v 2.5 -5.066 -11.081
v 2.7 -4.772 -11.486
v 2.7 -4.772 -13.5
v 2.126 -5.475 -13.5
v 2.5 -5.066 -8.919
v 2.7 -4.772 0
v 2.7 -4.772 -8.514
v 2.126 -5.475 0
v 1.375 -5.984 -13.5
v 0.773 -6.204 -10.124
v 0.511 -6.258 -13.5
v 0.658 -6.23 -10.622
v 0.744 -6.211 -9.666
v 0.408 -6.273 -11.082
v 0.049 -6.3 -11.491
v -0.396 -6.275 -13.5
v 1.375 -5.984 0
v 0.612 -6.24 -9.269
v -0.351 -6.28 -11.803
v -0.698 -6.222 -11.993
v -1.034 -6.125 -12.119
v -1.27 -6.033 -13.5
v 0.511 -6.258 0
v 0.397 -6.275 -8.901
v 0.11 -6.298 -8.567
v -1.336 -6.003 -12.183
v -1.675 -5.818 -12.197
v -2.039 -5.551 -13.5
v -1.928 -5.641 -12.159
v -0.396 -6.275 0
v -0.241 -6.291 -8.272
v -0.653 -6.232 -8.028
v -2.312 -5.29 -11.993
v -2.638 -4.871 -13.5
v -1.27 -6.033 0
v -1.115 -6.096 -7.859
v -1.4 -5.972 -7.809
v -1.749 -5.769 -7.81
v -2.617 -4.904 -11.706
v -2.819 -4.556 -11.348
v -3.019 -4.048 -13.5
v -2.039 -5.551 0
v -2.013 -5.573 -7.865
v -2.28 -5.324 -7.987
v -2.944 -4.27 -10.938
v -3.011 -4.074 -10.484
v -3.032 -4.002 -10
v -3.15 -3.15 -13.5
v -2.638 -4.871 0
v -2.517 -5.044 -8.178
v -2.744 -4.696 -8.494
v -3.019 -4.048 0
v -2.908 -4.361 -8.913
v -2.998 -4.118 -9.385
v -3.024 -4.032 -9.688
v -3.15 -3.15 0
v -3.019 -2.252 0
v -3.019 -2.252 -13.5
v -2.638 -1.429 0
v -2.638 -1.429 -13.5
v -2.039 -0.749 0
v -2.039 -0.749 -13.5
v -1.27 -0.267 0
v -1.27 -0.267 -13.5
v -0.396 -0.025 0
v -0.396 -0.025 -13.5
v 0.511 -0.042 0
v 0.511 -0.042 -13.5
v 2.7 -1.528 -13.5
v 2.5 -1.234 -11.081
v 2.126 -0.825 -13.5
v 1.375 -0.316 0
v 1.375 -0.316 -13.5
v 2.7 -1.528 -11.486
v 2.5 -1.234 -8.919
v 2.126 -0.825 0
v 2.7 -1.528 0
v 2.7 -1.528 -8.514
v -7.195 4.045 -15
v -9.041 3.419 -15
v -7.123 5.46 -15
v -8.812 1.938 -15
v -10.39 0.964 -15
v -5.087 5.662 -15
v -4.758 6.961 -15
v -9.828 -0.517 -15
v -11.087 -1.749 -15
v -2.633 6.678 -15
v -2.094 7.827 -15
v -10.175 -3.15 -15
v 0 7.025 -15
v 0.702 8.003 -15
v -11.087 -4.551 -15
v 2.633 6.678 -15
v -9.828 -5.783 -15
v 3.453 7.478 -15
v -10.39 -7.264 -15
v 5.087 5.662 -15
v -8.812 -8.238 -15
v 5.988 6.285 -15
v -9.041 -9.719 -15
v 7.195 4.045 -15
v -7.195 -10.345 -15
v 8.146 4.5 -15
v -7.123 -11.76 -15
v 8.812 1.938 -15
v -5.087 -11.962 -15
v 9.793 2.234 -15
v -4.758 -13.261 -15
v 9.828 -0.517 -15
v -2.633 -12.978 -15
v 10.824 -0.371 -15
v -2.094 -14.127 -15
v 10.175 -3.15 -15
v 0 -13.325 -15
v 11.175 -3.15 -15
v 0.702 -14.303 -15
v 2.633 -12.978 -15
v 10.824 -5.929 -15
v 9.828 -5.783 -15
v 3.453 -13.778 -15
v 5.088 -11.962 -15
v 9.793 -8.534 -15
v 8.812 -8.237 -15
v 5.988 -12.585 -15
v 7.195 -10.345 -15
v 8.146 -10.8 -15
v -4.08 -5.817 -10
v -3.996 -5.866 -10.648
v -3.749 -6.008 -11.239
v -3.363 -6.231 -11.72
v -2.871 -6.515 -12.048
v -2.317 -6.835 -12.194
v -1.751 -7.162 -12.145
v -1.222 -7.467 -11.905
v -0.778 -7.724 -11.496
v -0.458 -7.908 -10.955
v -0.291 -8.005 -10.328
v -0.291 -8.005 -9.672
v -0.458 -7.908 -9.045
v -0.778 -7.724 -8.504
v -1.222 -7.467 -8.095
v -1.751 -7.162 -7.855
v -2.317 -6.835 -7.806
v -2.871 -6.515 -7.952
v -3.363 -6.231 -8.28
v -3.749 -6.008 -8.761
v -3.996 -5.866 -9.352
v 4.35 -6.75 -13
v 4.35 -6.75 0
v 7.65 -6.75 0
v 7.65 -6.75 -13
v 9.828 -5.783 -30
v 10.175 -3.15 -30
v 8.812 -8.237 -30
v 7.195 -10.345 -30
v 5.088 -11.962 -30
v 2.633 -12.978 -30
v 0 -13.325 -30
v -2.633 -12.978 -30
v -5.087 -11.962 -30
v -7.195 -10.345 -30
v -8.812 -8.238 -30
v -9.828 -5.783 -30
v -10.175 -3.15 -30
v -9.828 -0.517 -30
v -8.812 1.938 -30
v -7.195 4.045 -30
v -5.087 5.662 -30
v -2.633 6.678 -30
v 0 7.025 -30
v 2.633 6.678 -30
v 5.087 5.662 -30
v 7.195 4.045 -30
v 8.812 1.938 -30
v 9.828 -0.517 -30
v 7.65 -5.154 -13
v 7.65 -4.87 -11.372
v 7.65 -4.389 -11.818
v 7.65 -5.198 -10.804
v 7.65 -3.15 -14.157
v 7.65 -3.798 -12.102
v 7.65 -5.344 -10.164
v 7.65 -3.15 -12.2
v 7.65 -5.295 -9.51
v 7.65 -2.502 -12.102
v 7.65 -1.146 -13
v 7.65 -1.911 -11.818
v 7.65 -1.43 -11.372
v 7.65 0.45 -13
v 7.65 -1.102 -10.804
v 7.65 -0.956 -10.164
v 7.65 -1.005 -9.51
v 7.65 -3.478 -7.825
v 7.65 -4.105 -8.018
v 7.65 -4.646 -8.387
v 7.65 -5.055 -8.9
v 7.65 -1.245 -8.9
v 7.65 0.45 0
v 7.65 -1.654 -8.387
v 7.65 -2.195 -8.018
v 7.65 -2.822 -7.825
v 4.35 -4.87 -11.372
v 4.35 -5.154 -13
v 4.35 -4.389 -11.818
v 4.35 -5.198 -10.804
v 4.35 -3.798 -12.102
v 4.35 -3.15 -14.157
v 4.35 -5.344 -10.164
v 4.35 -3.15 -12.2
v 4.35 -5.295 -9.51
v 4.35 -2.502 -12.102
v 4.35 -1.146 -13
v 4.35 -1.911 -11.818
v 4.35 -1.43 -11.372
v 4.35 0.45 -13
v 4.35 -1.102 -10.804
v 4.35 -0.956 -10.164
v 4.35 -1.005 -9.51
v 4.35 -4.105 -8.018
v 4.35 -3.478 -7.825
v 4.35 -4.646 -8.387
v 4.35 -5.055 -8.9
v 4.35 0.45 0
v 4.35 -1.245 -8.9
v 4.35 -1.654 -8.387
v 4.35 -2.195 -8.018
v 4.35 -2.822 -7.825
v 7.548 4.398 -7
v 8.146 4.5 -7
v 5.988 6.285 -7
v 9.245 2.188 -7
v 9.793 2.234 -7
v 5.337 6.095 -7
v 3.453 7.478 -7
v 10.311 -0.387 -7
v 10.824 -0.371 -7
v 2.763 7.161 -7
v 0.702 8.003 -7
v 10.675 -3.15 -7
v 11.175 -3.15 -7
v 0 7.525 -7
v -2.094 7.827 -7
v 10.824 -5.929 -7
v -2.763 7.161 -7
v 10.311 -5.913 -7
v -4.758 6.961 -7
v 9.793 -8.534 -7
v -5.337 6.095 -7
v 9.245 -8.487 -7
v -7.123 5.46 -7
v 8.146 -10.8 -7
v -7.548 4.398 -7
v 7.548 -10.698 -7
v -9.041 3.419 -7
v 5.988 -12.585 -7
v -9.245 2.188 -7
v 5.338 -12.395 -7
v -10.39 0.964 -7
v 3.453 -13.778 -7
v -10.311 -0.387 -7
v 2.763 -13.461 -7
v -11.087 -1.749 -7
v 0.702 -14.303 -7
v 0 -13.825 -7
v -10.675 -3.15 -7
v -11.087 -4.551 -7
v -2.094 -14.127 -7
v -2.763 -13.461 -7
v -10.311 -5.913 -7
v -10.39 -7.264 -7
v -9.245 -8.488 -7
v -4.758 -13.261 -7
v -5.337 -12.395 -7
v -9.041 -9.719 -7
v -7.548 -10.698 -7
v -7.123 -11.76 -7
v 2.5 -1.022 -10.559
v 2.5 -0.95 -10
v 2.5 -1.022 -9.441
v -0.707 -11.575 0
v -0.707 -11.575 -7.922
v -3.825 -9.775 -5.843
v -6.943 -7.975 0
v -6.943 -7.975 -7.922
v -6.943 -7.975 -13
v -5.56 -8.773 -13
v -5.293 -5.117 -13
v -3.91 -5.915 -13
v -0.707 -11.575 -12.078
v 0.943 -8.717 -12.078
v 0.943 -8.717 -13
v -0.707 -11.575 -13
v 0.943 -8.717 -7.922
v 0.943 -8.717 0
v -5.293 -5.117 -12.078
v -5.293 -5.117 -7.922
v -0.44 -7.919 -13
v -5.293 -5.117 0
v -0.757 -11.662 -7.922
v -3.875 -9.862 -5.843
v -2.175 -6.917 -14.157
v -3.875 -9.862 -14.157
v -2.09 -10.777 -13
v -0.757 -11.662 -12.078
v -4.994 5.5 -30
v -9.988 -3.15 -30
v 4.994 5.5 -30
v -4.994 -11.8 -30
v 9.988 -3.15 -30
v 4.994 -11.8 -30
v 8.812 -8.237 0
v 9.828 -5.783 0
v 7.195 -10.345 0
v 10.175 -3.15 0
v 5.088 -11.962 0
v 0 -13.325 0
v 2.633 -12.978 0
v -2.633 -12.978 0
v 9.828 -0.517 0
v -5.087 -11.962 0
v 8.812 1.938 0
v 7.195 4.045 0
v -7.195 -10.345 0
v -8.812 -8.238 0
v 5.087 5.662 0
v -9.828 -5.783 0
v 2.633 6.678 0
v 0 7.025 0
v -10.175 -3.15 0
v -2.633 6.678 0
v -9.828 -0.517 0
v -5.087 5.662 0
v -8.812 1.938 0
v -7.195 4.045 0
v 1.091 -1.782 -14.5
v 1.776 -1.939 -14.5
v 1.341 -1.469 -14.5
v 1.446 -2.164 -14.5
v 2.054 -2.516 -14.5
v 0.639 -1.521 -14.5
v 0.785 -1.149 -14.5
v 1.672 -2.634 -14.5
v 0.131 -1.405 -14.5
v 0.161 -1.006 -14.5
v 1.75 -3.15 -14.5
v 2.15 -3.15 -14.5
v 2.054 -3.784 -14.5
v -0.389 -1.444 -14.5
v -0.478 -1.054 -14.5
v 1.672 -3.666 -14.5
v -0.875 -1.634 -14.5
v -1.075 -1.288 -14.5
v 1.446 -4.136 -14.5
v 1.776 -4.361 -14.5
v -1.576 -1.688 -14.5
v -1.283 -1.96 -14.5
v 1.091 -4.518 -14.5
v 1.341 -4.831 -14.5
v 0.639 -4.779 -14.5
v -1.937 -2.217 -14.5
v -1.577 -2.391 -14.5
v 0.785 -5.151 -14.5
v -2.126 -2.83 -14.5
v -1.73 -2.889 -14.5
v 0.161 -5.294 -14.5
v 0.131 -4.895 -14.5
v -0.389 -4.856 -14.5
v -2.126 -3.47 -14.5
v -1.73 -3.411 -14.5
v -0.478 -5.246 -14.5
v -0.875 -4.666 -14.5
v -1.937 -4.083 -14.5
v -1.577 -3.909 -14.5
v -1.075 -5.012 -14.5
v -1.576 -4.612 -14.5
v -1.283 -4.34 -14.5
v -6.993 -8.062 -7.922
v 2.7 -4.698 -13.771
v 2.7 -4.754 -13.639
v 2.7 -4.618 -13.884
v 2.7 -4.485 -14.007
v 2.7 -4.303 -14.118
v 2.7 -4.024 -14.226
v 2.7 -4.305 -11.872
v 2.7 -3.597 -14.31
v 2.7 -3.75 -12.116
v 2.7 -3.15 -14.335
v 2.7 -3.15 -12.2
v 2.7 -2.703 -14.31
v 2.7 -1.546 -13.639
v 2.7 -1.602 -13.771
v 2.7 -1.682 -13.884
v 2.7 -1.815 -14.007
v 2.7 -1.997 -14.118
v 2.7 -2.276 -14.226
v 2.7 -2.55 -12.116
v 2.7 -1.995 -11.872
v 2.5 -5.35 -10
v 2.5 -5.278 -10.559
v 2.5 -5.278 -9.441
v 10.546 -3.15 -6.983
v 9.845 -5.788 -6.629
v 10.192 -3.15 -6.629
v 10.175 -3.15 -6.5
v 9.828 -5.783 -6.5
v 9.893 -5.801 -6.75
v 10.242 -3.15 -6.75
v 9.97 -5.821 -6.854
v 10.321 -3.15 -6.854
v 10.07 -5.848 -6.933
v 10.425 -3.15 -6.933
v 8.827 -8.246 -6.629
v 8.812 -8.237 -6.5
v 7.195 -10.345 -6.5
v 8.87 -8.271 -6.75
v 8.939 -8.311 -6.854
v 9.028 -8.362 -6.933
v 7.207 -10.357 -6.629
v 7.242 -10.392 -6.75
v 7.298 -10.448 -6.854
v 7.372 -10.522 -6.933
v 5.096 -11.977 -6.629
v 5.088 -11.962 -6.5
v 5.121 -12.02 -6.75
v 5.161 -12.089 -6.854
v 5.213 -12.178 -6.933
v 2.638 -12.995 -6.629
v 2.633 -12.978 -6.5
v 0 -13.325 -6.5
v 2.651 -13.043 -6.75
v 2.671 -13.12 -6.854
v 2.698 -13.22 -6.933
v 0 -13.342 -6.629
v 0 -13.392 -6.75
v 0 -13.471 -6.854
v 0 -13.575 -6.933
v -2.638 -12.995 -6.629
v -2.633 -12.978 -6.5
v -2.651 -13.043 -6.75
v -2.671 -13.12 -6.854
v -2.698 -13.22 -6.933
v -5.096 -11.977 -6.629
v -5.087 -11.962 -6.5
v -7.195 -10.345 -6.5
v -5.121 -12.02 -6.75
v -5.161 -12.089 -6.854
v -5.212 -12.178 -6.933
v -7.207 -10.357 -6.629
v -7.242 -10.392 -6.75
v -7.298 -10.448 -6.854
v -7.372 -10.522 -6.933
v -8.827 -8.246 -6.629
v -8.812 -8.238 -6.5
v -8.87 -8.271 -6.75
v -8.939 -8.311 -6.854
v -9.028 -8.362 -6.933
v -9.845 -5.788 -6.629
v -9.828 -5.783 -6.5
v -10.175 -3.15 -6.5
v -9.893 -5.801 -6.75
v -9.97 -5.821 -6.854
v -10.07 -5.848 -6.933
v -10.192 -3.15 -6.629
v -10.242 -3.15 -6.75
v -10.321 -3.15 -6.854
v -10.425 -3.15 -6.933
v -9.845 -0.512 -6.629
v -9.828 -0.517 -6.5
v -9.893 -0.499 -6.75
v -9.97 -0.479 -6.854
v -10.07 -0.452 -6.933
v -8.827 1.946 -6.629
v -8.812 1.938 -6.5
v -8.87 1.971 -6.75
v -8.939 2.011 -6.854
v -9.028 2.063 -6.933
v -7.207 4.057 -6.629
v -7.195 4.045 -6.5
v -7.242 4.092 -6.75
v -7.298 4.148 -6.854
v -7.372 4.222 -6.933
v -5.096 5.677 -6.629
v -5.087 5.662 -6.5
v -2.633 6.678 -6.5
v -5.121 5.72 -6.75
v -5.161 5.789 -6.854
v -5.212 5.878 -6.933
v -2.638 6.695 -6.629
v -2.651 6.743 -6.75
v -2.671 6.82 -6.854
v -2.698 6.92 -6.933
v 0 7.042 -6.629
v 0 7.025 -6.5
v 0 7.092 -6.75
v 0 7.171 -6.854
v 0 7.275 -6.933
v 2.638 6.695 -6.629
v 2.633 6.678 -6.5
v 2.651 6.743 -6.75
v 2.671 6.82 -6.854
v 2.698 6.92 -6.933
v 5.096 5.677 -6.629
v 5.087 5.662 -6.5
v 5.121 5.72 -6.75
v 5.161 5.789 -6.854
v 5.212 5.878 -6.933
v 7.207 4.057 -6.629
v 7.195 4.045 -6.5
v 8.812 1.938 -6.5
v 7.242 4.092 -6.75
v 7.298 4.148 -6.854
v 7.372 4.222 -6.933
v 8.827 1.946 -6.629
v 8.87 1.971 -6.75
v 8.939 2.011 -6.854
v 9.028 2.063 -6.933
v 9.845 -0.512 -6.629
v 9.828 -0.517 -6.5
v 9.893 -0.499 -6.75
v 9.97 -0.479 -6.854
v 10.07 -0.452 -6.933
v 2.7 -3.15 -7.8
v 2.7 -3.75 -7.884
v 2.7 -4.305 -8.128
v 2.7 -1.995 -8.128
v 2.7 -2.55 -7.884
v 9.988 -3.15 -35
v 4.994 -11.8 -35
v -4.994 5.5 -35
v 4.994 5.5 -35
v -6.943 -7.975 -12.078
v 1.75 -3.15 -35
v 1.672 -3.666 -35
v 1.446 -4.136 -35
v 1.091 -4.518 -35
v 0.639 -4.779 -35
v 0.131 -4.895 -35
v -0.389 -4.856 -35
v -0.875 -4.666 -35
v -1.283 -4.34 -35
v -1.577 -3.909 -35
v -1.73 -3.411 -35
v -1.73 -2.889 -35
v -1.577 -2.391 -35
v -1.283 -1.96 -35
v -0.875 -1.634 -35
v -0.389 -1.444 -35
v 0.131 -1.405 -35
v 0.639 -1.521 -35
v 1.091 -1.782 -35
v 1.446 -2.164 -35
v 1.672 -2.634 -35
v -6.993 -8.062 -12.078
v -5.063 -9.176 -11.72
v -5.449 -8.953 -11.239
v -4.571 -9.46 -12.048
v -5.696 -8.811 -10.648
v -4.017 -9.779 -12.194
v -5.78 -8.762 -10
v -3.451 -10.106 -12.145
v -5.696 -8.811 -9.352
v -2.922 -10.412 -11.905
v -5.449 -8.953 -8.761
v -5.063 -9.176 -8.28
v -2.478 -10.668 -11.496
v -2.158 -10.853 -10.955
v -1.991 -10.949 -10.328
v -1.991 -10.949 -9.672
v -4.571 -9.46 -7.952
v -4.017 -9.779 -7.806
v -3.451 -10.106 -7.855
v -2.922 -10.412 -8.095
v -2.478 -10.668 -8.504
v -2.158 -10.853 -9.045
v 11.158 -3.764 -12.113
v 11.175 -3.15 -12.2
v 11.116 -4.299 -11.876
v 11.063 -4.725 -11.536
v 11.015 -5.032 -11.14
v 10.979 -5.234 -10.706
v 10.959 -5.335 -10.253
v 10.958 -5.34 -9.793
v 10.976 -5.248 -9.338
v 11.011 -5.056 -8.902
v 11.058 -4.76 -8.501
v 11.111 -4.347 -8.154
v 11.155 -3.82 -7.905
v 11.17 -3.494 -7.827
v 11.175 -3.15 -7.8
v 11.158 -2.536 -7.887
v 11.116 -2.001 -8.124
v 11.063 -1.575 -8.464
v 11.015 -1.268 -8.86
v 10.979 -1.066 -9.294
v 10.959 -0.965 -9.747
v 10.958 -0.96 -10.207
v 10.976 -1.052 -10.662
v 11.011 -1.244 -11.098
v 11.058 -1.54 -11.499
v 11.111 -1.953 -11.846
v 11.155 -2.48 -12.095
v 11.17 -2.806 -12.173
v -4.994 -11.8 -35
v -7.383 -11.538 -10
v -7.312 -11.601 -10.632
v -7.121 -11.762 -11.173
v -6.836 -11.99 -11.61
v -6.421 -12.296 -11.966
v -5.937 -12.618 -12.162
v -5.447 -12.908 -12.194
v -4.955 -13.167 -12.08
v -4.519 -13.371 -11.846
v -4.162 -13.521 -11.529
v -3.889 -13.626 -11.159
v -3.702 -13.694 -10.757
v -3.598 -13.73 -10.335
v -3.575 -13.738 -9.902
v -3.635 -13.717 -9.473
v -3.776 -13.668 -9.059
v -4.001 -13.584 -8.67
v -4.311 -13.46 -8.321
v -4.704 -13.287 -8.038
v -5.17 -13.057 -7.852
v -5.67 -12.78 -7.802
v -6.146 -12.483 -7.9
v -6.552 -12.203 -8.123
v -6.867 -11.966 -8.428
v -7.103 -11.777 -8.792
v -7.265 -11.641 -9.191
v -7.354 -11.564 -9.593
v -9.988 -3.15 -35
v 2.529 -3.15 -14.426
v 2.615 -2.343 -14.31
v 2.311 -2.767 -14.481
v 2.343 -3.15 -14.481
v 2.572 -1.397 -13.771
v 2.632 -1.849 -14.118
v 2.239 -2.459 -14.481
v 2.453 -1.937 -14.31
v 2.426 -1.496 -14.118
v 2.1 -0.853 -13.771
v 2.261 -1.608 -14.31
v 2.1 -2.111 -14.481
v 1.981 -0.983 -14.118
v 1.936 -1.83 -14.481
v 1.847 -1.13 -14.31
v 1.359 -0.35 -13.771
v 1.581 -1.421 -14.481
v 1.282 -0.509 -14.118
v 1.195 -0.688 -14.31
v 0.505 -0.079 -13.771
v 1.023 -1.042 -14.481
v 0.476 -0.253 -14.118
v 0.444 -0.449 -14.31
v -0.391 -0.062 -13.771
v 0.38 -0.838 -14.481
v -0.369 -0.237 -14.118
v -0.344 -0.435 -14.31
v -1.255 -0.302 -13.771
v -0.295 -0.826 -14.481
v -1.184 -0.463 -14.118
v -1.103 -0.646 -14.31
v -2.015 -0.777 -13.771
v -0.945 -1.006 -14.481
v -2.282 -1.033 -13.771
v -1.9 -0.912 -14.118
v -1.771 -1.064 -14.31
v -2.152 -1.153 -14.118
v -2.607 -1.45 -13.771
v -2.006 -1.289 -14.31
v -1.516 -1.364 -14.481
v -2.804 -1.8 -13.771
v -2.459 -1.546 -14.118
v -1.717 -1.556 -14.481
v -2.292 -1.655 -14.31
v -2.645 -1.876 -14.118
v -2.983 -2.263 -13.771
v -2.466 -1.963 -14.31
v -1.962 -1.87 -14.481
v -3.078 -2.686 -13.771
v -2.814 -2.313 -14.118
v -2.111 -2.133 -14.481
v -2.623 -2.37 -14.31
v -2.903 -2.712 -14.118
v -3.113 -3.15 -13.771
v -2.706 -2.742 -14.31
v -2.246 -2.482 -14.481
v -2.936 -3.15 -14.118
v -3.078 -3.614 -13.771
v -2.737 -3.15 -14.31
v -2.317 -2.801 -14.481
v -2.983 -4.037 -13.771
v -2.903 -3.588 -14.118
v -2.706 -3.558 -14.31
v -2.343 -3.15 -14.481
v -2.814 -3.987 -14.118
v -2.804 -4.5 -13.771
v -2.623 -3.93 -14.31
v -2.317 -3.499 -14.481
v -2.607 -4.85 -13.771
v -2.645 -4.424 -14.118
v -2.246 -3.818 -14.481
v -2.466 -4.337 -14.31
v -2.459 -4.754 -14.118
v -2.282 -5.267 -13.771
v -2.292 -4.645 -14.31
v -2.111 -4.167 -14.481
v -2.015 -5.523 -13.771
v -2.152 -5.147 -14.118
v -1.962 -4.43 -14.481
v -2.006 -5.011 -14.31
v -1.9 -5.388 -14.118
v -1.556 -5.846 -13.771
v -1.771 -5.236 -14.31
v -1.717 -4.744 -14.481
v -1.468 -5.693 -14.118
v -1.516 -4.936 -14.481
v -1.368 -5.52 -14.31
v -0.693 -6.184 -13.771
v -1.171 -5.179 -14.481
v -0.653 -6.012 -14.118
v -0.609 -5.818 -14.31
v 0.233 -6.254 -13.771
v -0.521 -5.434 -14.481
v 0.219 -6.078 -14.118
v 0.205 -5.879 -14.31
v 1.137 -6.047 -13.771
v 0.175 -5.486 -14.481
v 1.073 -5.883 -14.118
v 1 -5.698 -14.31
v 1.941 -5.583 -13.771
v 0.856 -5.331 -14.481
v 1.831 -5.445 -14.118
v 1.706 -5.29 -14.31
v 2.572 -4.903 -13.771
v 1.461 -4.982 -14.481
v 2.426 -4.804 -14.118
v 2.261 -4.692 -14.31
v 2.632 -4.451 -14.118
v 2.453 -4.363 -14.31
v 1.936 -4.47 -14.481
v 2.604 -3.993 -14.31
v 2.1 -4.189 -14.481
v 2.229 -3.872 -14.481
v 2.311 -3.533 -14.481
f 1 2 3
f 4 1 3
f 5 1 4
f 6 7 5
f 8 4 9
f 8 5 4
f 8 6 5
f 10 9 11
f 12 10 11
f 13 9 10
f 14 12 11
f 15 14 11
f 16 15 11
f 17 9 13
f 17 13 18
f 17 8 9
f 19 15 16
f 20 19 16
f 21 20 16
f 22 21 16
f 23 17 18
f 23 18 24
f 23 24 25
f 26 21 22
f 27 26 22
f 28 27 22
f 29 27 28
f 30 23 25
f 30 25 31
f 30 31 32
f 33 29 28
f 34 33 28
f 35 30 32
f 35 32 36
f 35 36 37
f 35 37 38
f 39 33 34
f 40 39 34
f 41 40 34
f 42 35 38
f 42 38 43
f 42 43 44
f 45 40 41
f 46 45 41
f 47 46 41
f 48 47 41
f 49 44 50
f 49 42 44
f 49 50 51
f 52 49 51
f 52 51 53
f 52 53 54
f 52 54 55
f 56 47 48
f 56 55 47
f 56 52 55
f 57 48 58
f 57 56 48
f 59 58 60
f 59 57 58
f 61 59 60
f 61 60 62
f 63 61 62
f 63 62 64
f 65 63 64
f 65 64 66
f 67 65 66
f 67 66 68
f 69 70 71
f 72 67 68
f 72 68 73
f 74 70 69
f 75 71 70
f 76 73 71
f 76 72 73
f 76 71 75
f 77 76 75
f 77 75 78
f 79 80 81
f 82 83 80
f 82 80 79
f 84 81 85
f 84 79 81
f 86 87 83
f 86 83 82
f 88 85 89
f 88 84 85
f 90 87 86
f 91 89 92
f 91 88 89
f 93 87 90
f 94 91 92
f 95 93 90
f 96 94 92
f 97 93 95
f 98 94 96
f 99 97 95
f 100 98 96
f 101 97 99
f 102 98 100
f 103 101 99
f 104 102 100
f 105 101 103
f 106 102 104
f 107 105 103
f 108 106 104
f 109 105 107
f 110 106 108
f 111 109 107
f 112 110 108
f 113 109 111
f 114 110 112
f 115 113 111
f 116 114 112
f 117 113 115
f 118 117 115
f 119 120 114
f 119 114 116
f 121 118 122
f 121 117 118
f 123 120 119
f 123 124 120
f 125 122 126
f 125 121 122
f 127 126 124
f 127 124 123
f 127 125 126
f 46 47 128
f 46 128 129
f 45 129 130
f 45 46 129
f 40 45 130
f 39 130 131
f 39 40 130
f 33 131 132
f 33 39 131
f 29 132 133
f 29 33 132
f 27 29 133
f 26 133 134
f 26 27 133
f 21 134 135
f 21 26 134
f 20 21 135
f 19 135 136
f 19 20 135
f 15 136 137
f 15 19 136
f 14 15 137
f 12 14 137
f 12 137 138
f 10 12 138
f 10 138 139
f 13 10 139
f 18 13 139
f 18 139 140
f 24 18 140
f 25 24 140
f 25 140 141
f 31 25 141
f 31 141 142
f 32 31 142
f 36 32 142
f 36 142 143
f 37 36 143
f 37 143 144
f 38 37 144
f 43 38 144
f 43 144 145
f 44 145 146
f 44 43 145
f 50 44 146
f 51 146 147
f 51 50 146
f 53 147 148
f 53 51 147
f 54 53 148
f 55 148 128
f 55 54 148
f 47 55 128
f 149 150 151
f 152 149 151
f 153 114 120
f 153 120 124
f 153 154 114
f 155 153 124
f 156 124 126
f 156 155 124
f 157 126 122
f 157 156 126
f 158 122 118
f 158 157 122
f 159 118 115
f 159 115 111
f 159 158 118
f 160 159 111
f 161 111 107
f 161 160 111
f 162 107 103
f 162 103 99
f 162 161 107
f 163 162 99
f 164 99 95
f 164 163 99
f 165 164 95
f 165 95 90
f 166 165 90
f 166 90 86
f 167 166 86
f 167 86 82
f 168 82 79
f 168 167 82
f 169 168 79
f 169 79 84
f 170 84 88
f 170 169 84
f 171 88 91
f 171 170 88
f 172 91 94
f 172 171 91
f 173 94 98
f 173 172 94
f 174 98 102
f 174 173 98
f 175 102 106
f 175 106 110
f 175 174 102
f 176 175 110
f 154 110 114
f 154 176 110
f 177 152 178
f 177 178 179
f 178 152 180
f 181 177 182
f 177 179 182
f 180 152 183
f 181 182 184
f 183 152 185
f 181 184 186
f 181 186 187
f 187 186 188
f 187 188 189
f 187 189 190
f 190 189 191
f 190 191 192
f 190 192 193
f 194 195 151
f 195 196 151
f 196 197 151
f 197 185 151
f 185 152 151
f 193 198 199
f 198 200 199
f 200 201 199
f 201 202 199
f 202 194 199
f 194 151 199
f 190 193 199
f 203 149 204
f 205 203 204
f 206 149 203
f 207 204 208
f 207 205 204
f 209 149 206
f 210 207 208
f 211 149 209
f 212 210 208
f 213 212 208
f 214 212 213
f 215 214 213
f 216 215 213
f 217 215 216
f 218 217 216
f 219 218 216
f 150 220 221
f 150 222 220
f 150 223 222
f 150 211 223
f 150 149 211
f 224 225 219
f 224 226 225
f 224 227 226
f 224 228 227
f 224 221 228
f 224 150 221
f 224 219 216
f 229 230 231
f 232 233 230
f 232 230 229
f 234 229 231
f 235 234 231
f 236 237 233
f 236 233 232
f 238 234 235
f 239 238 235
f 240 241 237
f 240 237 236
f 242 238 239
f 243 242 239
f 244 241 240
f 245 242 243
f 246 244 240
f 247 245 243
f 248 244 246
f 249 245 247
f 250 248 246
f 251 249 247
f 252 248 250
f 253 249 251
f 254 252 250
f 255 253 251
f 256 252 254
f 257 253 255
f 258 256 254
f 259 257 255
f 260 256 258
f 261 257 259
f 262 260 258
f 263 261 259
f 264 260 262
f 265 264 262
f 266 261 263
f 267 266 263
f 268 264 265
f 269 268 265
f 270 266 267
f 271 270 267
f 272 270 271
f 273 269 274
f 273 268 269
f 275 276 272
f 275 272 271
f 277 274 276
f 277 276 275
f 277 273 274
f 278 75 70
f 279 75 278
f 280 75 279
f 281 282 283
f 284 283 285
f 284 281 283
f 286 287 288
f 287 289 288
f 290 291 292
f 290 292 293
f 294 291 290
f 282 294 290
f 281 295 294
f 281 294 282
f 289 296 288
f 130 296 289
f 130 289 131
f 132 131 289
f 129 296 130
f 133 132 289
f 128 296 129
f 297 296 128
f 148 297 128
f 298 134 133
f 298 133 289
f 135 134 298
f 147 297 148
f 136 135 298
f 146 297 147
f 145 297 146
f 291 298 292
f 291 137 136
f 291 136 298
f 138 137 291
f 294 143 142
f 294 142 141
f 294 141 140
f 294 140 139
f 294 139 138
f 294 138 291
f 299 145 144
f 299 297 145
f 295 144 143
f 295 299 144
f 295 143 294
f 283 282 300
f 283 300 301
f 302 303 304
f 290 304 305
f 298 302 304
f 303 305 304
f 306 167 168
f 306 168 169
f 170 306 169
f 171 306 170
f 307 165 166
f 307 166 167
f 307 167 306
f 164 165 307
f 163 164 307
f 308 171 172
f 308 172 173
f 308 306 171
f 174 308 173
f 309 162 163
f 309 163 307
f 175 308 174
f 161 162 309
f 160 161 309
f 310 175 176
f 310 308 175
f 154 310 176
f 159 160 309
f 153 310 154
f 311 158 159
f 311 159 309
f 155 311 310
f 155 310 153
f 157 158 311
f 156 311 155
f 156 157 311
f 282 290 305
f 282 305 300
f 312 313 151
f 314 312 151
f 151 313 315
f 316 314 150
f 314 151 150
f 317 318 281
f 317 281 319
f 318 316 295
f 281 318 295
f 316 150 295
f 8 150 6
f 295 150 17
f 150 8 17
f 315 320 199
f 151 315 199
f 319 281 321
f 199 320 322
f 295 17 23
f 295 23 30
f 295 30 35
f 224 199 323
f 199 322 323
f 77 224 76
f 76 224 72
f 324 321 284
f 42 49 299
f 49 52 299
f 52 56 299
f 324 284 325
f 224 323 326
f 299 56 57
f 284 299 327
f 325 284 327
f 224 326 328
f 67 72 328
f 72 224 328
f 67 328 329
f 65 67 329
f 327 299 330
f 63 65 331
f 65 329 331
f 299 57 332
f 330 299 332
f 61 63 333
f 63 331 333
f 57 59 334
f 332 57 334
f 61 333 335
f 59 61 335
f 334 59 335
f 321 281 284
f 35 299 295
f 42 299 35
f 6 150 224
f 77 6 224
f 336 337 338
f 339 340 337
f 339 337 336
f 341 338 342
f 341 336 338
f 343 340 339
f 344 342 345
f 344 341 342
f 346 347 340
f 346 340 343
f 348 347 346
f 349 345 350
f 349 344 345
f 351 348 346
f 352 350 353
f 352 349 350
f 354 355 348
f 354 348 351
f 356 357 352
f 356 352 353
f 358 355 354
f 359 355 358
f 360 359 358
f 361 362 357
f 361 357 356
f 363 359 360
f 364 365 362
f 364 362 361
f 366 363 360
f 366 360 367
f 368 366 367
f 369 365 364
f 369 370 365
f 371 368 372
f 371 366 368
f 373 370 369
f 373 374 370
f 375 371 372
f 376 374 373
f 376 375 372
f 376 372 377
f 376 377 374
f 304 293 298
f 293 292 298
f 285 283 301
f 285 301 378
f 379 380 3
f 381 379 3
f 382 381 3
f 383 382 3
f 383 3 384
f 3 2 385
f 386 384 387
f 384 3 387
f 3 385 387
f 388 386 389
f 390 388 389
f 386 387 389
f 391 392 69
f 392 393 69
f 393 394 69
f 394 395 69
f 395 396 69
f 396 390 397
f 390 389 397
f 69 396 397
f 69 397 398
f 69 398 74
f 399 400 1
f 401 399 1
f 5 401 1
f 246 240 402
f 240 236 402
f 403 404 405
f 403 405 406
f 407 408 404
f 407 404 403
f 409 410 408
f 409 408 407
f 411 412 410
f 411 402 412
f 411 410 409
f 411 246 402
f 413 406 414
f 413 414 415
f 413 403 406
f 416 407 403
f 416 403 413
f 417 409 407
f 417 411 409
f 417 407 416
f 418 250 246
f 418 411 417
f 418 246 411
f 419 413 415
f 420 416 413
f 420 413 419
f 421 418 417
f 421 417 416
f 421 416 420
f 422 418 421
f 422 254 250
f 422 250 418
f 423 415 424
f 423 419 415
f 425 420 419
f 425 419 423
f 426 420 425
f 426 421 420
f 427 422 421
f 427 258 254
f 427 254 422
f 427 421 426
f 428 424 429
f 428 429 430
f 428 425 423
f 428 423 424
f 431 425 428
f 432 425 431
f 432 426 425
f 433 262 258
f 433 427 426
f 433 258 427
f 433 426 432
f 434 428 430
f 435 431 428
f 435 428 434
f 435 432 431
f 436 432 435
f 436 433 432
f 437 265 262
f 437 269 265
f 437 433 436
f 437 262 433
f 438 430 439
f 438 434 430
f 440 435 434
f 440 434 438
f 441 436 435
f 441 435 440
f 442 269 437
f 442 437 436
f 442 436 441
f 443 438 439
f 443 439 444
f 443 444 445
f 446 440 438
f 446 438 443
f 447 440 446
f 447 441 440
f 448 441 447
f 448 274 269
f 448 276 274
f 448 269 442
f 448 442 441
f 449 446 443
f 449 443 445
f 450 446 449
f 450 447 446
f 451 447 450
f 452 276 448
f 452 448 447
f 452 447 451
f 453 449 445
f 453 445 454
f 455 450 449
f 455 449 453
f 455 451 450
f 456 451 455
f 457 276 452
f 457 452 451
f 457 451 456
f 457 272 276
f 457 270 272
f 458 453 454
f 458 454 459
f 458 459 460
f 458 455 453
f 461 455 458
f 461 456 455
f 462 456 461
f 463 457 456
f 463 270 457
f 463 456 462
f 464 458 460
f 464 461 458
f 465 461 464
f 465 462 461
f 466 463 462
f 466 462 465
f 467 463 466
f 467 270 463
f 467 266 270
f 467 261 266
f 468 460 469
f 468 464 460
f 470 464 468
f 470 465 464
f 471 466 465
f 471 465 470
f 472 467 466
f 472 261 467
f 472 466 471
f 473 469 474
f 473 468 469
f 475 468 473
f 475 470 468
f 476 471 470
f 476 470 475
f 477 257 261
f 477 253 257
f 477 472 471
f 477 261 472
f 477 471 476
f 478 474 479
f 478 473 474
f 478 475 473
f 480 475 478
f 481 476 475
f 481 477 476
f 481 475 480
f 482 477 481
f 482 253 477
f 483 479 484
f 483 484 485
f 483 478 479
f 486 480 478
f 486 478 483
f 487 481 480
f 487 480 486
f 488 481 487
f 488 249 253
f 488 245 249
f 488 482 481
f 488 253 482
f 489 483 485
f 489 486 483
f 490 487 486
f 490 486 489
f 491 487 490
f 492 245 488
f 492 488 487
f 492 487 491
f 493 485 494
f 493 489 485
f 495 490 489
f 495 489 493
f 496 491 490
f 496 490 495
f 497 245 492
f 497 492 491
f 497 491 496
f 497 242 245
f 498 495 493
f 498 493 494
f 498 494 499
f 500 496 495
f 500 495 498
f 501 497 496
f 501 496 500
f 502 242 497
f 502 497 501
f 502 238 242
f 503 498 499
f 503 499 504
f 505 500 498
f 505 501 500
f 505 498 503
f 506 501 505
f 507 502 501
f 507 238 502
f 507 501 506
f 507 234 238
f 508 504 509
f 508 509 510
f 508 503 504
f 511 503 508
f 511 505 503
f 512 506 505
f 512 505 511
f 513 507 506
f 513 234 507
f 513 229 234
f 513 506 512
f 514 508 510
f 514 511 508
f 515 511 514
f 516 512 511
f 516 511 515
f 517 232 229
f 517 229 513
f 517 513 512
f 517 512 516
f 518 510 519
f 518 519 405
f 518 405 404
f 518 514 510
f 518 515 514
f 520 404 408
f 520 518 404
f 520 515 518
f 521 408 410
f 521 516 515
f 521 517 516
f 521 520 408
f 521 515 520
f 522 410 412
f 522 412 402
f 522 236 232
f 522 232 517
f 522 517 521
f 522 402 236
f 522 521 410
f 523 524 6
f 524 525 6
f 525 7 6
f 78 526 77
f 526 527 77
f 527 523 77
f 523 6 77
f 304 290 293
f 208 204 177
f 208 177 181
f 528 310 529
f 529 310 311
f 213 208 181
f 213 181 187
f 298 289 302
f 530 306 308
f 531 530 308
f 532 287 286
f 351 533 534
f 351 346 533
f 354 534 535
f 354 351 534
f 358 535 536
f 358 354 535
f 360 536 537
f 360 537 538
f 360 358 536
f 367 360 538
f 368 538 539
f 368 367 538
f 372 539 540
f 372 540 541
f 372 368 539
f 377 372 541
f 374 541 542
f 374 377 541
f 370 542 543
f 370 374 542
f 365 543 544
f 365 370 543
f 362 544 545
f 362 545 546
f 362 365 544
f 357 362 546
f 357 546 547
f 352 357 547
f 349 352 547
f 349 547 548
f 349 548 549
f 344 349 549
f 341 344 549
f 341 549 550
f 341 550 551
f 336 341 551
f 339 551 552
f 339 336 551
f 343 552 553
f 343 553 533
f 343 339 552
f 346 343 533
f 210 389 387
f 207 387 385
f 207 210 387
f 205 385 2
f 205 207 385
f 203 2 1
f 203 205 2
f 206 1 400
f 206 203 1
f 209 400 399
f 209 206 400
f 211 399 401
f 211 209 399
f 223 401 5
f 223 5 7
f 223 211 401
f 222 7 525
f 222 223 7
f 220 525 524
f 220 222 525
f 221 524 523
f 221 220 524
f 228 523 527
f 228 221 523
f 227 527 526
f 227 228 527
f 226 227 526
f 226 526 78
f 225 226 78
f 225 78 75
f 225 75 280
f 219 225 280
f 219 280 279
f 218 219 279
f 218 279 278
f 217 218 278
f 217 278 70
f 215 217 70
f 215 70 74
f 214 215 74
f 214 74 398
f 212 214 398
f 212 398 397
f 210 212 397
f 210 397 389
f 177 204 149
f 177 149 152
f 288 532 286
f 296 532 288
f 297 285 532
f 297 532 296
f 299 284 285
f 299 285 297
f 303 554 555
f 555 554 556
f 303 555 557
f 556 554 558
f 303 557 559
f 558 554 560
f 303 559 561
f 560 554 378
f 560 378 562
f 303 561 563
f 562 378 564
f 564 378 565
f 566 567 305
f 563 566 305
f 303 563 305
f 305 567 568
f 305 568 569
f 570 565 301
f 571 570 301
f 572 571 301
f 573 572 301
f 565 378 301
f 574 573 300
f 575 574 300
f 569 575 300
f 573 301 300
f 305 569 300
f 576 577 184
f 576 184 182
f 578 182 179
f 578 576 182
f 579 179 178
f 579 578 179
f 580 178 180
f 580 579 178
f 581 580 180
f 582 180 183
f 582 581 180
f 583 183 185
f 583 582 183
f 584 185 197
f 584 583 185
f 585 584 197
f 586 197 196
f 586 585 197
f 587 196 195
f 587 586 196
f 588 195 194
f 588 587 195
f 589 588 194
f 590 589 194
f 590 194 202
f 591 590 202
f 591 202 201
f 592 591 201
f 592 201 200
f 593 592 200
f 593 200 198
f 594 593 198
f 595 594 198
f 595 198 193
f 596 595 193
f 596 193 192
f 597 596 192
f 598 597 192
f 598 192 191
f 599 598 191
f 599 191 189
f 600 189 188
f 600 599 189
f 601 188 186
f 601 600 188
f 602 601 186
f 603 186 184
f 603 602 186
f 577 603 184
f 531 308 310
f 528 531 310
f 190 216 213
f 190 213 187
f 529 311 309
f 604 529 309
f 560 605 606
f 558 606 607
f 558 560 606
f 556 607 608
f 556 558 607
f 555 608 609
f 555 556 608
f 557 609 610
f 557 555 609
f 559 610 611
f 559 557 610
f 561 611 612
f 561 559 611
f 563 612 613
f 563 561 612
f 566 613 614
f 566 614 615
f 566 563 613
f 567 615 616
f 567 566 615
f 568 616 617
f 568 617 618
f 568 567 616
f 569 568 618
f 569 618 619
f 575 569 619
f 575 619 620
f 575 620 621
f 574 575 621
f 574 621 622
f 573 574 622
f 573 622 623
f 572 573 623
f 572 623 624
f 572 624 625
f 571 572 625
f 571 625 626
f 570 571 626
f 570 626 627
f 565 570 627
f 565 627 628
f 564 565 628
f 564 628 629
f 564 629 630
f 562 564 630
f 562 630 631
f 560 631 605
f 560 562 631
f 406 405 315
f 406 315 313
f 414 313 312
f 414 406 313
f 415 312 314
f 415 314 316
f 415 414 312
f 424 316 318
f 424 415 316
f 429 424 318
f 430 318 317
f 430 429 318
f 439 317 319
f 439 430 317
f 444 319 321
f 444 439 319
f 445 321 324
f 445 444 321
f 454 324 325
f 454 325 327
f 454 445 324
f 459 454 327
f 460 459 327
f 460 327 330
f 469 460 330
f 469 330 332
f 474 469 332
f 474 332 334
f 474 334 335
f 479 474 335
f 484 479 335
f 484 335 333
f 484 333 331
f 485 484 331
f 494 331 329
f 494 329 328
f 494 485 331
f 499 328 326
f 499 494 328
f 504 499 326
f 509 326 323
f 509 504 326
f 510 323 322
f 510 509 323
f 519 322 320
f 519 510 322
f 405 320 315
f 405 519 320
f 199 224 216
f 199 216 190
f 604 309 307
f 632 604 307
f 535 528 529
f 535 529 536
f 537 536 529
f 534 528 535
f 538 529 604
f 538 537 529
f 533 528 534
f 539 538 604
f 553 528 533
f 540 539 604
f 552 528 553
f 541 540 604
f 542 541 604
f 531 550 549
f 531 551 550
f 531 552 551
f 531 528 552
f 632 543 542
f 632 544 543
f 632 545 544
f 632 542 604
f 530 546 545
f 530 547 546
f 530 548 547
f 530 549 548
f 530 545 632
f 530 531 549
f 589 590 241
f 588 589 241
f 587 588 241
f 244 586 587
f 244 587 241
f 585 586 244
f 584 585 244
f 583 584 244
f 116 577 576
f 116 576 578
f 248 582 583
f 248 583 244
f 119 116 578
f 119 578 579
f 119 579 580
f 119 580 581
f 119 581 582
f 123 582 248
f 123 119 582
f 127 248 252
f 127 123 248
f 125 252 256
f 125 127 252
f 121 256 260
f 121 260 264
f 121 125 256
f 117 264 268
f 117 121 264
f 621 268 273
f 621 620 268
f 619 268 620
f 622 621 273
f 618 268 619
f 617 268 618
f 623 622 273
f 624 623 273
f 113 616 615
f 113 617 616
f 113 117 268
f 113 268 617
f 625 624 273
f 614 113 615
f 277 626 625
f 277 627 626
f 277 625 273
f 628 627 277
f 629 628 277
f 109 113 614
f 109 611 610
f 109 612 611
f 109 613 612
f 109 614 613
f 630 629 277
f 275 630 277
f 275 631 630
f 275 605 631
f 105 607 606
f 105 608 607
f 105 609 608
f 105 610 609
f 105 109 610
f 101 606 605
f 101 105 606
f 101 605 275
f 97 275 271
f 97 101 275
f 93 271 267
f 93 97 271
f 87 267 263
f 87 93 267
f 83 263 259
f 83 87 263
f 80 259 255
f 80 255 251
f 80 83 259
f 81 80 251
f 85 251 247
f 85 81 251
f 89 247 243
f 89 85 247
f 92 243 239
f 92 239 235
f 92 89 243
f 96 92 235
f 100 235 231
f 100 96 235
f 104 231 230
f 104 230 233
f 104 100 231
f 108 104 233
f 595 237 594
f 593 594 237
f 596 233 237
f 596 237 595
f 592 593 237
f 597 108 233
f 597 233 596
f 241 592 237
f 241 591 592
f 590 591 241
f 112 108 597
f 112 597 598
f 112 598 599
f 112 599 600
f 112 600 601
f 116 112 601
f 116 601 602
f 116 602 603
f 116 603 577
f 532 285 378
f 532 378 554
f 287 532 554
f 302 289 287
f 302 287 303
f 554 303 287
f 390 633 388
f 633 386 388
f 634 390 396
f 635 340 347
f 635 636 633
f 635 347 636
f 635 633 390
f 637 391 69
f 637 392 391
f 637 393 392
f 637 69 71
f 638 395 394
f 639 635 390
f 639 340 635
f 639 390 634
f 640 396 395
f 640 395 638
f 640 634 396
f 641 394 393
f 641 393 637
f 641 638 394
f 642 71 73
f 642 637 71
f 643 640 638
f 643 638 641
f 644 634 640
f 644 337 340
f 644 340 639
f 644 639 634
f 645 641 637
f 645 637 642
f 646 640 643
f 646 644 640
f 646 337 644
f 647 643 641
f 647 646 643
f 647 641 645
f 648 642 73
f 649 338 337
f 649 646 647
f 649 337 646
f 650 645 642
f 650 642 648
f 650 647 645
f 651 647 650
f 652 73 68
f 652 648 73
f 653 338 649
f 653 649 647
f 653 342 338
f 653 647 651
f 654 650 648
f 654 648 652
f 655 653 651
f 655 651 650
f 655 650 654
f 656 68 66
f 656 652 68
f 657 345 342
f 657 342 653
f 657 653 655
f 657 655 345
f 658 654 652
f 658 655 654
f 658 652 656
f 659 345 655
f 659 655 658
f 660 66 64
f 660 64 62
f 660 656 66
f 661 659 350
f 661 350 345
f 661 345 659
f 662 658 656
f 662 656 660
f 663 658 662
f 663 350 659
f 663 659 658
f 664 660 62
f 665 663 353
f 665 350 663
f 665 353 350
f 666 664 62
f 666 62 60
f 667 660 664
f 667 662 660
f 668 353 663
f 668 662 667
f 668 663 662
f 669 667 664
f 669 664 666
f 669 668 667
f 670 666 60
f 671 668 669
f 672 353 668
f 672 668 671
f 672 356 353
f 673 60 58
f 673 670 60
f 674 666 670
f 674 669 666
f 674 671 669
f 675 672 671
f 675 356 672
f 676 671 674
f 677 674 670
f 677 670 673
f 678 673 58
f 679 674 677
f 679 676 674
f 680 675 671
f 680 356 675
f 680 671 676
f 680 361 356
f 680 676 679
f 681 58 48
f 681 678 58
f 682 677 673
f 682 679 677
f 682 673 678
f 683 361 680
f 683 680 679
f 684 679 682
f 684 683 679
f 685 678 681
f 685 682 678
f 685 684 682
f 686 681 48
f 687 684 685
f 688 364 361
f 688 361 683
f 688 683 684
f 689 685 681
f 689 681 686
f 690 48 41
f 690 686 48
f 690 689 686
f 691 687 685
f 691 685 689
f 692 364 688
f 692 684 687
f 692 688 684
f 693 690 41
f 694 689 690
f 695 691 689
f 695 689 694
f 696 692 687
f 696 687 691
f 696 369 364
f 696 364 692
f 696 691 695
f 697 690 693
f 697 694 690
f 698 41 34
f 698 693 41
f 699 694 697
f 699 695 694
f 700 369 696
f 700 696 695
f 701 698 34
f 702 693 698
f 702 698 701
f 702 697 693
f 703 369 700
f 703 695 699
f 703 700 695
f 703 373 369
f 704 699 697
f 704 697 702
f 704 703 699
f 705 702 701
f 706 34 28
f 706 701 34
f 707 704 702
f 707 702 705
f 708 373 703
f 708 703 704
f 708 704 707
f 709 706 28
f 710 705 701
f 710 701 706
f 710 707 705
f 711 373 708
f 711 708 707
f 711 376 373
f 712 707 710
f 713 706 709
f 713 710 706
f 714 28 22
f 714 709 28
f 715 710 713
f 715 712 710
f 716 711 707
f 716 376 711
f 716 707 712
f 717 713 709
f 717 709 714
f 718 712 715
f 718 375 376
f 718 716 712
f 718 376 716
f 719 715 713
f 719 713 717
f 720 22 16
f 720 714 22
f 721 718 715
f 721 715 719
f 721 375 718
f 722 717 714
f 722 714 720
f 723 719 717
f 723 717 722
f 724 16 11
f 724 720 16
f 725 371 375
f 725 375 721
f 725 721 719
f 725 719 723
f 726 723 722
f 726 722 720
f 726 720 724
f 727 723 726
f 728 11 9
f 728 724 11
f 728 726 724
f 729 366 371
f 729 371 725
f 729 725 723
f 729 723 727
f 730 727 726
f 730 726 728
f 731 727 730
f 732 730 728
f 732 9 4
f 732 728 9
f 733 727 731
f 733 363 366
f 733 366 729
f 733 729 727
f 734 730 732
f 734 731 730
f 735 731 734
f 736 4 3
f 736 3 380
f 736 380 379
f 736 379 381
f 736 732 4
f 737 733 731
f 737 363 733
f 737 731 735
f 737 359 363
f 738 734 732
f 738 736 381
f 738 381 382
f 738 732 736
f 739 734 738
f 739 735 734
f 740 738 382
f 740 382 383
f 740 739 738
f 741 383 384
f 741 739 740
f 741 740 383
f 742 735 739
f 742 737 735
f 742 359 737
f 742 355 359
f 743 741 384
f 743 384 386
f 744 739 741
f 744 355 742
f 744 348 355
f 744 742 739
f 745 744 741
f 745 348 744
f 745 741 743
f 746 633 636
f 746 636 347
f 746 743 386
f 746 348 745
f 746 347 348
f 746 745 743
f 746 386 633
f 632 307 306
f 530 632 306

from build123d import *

# Parameters (mm, degrees)
SKETCH_2_R               = 1.75
EXTRUDE_1_DEPTH          = 5
SKETCH_3_W               = 2.5
SKETCH_3_H               = 7.4
EXTRUDE_2_DEPTH          = 15
CUT_EXTRUDE_1_DEPTH      = 0.2
CUT_EXTRUDE_1_DEPTH_BACK = 12
SKETCH_4_R               = 2.2
SKETCH_9_W               = 3.3
SKETCH_9_H               = 7.2
CUT_EXTRUDE_5_DEPTH      = 13
CUT_EXTRUDE_6_DEPTH      = 3.3
CUT_EXTRUDE_7_DEPTH      = 10
CUT_EXTRUDE_7_DEPTH_BACK = 5
SKETCH_12_R              = 2.2
CUT_EXTRUDE_8_DEPTH      = 3.4
FILLET_2_R               = 0.5


with BuildPart() as part:
    # Эскиз1 → Повернуть1 (revolve)
    with BuildSketch(Plane(origin=(0, 0, 0), x_dir=(0, 0, -1), z_dir=(1, 0, 0)), mode=Mode.PRIVATE) as revolve_1_sk:
        Polygon((0, 0), (0, 7.025), (7, 7.025), (7, 8.025), (15, 8.025), (15, 7.025), (30, 7.025), (30, -1.4), (14.5, -1.4), (14.5, 0), align=None)
    revolve(revolve_1_sk.sketch.rotate(Axis((0, -3.15, 0), (0, 0, -1)), 90), axis=Axis((0, -3.15, 0), (0, 0, -1)))

    # Эскиз2 → Бобышка-Вытянуть1 (add)
    with BuildSketch(Plane(origin=(0, 0, -30), x_dir=(-1, 0, 0), z_dir=(0, 0, -1))):
        Polygon((4.994079828, 5.5), (-4.994079828, 5.5), (-9.988159657, -3.15), (-4.994079828, -11.8), (4.994079828, -11.8), (9.988159657, -3.15), align=None)
        with Locations(Location((0, -3.15, 0), (0, 0, 180))):
            Circle(SKETCH_2_R, mode=Mode.SUBTRACT)
    extrude(amount=EXTRUDE_1_DEPTH)

    # Эскиз3 → Бобышка-Вытянуть2 (add)
    with BuildSketch(Plane.XY):
        with BuildLine():
            Line((2.7, -4.772498074), (2.7, -1.527501926))
            ThreePointArc((2.7, -1.527501926), (3.15, -3.15), (2.7, -4.772498074))
        make_face()
        with Locations((5.7, -3.15)):
            Rectangle(SKETCH_3_W, SKETCH_3_H)
    extrude(amount=-EXTRUDE_2_DEPTH)

    # Эскиз4 → Вырез-Вытянуть1 (cut, two sides: drawn at the far end of the back side and taken through both)
    with BuildSketch(Plane.ZY.offset(-2.7).offset(-CUT_EXTRUDE_1_DEPTH_BACK)):
        with Locations(Location((-10, -3.15, 0), (0, 0, 180))):
            Circle(SKETCH_4_R)
    extrude(amount=CUT_EXTRUDE_1_DEPTH + CUT_EXTRUDE_1_DEPTH_BACK, mode=Mode.SUBTRACT)

    # Скругление1: read off the stored shape, not the designer's step
    # Скругление1 outline → Скругление1 (revolve)
    with BuildSketch(Plane.XZ.offset(3.15)):
        with BuildLine():
            Line((3.15, -14.5), (3.15, -13.5))
            ThreePointArc((3.15, -13.5), (2.857106781, -14.207106781), (2.15, -14.5))
            Line((2.15, -14.5), (3.15, -14.5))
        make_face()
    revolve(axis=Axis((0, -3.15, 0), (0, 0, 1)))

    # Эскиз9 → Вырез-Вытянуть5 (cut)
    with BuildSketch(Plane.XY):
        with Locations((6, -3.15)):
            Rectangle(SKETCH_9_W, SKETCH_9_H)
        Polygon((-6.942691454, -7.975094339), (-5.292691454, -5.117210506), (0.942691454, -8.717210506), (-0.707308546, -11.575094339), align=None)
    extrude(amount=-CUT_EXTRUDE_5_DEPTH, mode=Mode.SUBTRACT)

    # Эскиз10 → Вырез-Вытянуть6 (cut)
    with BuildSketch(Plane(origin=(4.35, 0, 0), x_dir=(0, 0, -1), z_dir=(1, 0, 0))):
        Polygon((5.843078062, -3.15), (7.921539031, -6.75), (12.078460969, -6.75), (14.156921938, -3.15), (12.078460969, 0.45), (7.921539031, 0.45), align=None)
    extrude(amount=CUT_EXTRUDE_6_DEPTH, mode=Mode.SUBTRACT)

    # Эскиз12 → Вырез-Вытянуть7 (cut, two sides: drawn at the far end of the back side and taken through both)
    with BuildSketch(Plane(origin=(-3.538990011, -6.129710506, 0), x_dir=(0.8660254037844364, -0.500000000000004, 0), z_dir=(-0.500000000000004, -0.8660254037844365, 0)).offset(-CUT_EXTRUDE_7_DEPTH_BACK)):
        with Locations(Location((1.575, -10, 0), (0, 0, 180))):
            Circle(SKETCH_12_R)
    extrude(amount=CUT_EXTRUDE_7_DEPTH + CUT_EXTRUDE_7_DEPTH_BACK, mode=Mode.SUBTRACT)

    # Эскиз13 → Вырез-Вытянуть8 (cut)
    with BuildSketch(Plane(origin=(-3.538990011, -6.129710506, 0), x_dir=(0.8660254037844364, -0.500000000000004, 0), z_dir=(-0.500000000000004, -0.8660254037844365, 0))):
        Polygon((-2.025, -7.921539031), (-2.025, -12.078460969), (1.575, -14.156921938), (5.175, -12.078460969), (5.175, -7.921539031), (1.575, -5.843078062), align=None)
    extrude(amount=CUT_EXTRUDE_8_DEPTH, mode=Mode.SUBTRACT)

    # Скругление2
    fillet_2_edges = [part.edges().sort_by_distance(p)[0] for p in [
        (-10.175, -3.15, -7),
    ]]
    fillet(fillet_2_edges, radius=FILLET_2_R)


solid = part.part
